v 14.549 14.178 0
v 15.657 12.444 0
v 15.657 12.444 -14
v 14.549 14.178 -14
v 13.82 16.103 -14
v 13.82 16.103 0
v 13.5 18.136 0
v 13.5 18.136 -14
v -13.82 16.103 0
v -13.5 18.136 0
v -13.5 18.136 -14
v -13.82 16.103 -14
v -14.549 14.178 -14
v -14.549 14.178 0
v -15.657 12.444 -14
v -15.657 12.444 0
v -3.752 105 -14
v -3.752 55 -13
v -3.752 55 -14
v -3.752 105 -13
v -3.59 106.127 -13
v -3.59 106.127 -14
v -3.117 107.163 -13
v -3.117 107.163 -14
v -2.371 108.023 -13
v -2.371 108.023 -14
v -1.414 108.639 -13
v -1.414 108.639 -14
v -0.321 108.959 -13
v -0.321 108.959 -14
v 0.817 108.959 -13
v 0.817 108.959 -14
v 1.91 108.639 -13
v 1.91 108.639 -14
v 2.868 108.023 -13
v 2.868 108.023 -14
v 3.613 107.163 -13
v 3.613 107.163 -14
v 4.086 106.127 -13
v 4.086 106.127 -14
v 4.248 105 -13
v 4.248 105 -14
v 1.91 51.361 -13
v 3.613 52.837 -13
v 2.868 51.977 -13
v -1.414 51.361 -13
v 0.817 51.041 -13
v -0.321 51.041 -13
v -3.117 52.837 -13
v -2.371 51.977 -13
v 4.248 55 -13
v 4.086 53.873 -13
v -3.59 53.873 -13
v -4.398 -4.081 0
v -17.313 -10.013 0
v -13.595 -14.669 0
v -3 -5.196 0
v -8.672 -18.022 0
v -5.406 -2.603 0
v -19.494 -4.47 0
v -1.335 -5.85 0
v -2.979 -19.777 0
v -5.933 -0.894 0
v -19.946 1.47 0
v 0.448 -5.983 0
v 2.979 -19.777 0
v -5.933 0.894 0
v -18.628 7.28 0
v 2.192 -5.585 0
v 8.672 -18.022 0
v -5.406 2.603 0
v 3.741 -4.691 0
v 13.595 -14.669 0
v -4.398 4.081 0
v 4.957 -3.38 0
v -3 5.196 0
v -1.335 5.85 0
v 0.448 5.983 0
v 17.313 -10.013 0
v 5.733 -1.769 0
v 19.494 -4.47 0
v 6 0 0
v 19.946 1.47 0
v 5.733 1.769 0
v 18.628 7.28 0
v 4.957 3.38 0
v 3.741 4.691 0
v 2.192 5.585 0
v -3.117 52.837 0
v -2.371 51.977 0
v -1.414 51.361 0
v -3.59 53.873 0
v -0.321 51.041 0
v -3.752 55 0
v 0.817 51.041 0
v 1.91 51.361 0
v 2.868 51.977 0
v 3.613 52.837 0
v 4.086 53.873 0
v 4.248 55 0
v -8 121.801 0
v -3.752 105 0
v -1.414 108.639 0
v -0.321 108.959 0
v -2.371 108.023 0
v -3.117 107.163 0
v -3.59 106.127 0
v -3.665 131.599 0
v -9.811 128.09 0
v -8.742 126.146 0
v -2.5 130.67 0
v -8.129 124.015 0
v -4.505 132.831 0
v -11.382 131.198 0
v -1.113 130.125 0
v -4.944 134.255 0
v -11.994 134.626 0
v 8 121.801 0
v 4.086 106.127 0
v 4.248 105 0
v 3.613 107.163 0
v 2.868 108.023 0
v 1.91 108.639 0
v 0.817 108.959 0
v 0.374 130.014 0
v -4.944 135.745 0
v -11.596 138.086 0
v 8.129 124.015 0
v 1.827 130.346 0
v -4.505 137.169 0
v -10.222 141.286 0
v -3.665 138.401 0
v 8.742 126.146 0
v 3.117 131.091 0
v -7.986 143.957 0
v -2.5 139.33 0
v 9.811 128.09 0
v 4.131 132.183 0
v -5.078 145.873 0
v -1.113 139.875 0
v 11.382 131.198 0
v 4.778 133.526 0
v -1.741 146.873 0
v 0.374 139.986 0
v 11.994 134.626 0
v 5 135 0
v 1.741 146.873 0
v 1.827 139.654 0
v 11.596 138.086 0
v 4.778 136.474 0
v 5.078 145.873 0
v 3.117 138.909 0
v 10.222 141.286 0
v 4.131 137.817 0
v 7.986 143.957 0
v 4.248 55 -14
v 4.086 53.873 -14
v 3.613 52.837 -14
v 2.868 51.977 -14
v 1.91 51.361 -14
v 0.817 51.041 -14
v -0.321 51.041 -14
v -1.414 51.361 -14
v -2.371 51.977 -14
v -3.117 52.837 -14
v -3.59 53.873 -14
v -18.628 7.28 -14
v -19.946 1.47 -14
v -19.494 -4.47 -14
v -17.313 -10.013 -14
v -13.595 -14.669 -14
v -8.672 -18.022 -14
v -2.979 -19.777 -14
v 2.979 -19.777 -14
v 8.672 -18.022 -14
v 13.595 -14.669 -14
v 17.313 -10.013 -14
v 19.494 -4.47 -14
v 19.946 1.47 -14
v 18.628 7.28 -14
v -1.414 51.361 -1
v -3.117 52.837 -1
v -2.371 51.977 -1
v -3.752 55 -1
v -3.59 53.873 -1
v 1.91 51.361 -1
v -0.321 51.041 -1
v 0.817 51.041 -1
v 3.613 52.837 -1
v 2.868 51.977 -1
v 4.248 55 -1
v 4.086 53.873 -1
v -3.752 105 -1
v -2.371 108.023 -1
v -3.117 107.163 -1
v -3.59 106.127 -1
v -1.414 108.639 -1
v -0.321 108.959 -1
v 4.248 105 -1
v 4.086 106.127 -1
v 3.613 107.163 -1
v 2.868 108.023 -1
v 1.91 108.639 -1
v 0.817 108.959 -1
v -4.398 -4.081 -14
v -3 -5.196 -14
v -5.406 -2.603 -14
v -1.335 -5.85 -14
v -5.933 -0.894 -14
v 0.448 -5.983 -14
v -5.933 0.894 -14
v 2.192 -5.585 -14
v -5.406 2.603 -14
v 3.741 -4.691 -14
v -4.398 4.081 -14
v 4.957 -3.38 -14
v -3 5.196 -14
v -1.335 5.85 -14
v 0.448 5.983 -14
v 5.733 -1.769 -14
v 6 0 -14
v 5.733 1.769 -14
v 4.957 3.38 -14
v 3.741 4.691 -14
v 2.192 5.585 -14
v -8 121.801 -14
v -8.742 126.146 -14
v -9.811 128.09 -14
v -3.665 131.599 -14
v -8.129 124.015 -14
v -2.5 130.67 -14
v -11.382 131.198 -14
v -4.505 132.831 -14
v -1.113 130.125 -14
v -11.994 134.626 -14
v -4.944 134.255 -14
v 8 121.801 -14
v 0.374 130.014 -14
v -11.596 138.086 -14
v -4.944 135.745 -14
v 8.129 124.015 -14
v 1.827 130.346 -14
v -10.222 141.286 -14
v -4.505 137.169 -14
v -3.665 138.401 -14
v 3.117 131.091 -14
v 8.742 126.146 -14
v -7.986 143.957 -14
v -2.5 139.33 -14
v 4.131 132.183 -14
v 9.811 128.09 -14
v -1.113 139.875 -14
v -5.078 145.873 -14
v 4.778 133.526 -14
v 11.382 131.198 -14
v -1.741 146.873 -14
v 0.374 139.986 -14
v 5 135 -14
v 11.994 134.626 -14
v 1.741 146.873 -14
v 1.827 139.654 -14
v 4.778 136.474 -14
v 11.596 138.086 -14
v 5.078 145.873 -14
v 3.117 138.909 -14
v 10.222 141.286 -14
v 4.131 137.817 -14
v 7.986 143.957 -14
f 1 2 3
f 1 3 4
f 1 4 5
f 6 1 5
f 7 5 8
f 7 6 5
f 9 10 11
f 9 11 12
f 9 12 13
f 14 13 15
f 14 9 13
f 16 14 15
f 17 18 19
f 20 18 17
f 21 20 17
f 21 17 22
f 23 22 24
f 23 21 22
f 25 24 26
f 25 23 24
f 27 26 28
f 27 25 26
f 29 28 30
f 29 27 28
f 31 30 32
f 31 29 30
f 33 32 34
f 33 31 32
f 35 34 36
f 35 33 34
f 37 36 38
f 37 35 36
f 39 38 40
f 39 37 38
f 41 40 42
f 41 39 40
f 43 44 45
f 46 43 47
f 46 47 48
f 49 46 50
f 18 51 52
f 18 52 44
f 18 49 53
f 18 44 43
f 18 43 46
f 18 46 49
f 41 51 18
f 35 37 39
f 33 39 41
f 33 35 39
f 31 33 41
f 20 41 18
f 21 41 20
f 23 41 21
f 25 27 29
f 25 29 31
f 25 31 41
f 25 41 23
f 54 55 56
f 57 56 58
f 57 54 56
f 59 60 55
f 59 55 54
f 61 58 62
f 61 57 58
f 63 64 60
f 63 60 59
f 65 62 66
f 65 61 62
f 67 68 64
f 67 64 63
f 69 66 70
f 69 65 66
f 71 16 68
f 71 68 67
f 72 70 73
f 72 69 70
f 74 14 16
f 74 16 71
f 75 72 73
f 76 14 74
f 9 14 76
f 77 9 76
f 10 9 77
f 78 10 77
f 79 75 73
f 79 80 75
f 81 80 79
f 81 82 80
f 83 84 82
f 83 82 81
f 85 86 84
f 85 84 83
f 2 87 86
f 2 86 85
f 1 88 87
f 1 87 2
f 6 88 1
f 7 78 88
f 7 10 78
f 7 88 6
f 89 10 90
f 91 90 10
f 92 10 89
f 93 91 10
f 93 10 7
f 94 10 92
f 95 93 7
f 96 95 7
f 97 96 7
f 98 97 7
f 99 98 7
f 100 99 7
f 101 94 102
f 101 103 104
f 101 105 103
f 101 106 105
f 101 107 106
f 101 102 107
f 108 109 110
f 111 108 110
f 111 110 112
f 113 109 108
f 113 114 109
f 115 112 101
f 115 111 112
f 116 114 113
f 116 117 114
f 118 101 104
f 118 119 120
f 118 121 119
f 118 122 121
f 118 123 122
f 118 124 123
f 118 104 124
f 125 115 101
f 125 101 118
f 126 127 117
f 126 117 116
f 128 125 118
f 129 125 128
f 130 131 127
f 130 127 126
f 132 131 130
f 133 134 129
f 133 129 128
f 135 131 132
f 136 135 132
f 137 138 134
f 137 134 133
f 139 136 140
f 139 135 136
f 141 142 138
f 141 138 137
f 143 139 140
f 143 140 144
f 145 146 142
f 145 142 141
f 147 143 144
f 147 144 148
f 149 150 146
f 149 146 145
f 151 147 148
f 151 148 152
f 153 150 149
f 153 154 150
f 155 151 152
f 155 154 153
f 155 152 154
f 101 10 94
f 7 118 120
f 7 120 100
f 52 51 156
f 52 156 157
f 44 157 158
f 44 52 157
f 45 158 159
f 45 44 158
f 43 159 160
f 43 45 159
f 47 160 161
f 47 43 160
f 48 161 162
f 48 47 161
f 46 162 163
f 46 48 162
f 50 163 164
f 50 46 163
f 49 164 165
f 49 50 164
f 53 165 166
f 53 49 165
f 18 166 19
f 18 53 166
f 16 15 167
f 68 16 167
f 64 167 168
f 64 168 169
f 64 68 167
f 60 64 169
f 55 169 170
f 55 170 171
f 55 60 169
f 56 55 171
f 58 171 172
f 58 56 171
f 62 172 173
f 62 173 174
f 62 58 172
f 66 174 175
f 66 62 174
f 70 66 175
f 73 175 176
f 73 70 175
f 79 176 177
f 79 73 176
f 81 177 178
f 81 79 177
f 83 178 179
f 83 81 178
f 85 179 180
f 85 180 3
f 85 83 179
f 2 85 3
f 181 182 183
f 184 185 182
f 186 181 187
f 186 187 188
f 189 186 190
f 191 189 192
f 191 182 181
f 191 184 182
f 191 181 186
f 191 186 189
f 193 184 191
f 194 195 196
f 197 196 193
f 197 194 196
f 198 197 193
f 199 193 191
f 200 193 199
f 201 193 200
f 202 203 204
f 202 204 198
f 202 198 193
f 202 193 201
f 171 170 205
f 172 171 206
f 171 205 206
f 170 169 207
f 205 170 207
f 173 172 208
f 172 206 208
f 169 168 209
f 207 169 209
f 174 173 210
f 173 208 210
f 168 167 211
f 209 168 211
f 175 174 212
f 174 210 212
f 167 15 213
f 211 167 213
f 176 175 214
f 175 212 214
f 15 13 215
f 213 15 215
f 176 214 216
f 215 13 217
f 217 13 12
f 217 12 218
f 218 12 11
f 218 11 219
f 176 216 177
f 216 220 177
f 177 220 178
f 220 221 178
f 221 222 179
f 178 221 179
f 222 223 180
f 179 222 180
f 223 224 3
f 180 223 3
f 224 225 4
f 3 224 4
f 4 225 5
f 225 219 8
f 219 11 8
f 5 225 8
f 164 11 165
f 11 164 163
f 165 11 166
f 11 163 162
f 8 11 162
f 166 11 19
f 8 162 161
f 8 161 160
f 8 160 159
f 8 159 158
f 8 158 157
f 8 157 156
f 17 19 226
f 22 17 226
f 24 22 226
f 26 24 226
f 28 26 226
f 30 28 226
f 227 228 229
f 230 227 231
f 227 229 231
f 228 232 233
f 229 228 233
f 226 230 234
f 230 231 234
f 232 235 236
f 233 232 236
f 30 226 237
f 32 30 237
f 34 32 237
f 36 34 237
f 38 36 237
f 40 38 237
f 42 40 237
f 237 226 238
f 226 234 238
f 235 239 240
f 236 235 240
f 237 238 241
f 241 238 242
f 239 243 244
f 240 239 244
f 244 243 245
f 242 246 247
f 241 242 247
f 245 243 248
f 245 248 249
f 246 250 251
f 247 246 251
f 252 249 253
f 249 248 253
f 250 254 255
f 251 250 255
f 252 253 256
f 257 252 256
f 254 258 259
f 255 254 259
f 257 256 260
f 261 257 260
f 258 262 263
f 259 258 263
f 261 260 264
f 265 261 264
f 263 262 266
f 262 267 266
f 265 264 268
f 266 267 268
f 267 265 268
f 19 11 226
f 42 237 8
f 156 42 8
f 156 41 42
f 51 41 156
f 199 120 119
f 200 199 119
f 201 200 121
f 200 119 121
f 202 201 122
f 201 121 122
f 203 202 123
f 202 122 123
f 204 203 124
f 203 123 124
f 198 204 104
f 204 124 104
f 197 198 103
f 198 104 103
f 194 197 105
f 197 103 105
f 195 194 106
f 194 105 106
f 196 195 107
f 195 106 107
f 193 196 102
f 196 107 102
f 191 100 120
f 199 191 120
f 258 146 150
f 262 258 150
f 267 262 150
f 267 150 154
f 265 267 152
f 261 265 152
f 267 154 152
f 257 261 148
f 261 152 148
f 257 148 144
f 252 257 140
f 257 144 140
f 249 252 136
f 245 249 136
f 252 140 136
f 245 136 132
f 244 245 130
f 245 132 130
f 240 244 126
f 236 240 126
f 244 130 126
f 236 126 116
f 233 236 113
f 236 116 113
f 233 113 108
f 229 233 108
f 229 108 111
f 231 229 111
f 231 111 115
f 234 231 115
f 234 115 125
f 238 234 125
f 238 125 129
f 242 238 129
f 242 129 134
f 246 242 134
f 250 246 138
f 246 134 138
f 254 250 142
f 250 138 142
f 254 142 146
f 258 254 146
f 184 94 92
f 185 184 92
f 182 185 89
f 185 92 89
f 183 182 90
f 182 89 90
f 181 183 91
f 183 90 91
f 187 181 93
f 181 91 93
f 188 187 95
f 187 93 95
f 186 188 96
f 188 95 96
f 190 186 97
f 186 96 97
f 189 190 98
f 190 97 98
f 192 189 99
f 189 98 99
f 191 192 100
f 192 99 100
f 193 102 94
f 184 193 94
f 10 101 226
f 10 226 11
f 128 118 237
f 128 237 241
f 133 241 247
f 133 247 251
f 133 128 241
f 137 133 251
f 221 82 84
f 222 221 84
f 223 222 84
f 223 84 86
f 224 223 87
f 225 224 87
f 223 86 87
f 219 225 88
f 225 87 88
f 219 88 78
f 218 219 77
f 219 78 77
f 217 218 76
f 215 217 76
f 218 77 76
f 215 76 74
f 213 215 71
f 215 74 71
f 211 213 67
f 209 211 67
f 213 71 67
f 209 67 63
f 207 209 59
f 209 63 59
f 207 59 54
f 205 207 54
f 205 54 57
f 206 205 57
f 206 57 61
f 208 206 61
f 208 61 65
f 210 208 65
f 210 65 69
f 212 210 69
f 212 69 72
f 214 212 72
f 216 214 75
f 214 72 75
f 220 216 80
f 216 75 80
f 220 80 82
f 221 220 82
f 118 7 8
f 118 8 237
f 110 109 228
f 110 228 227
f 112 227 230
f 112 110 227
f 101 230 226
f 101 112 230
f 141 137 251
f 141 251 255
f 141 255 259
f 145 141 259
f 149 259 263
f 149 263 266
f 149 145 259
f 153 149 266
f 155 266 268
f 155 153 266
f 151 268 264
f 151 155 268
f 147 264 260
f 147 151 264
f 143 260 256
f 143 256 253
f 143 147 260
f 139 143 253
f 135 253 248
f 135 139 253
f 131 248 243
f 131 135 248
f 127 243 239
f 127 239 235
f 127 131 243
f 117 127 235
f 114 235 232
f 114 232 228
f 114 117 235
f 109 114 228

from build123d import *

# Parameters (mm, degrees)
SKETCH_1_R          = 6
SKETCH_1_R_2        = 5
EXTRUDE_1_DEPTH     = 14
CUT_EXTRUDE_1_DEPTH = 1
CUT_EXTRUDE_START   = -1
CUT_EXTRUDE_2_DEPTH = 1


with BuildPart() as part:
    # 草图1 → 拉伸1 (new body)
    with BuildSketch(Plane.XY):
        with BuildLine():
            Line((-8, 121.801117832), (-13.5, 18.135932445))
            ThreePointArc((-13.5, 18.135932445), (-14.135015735, 15.121742333), (-15.657303504, 12.443827667))
            ThreePointArc((-15.657303504, 12.443827667), (0, -20), (15.657303504, 12.443827667))
            ThreePointArc((15.657303504, 12.443827667), (14.135015735, 15.121742333), (13.5, 18.135932445))
            Line((13.5, 18.135932445), (8, 121.801117832))
            ThreePointArc((8, 121.801117832), (8.376311259, 125.097647375), (9.810521048, 128.089596484))
            ThreePointArc((9.810521048, 128.089596484), (0, 147), (-9.810521048, 128.089596484))
            ThreePointArc((-9.810521048, 128.089596484), (-8.376311259, 125.097647375), (-8, 121.801117832))
        make_face()
        Circle(SKETCH_1_R, mode=Mode.SUBTRACT)
        with Locations((0, 135)):
            Circle(SKETCH_1_R_2, mode=Mode.SUBTRACT)
    extrude(amount=-EXTRUDE_1_DEPTH)

    # 草图2 → 切除-拉伸1 (cut)
    with BuildSketch(Plane.XY):
        with BuildLine():
            Line((-3.75192728, 105), (-3.75192728, 55))
            ThreePointArc((-3.75192728, 55), (0.24807272, 51), (4.24807272, 55))
            Line((4.24807272, 55), (4.24807272, 105))
            ThreePointArc((4.24807272, 105), (0.24807272, 109), (-3.75192728, 105))
        make_face()
    extrude(amount=-CUT_EXTRUDE_1_DEPTH, mode=Mode.SUBTRACT)

    # 草图3 → 切除-拉伸2 (cut)
    with BuildSketch(Plane(origin=(0, 0, -14), x_dir=(-1, 0, 0), z_dir=(0, 0, -1)).offset(CUT_EXTRUDE_START)):
        with BuildLine():
            Line((3.75192728, 55), (3.75192728, 105))
            ThreePointArc((3.75192728, 105), (-0.24807272, 109), (-4.24807272, 105))
            Line((-4.24807272, 105), (-4.24807272, 55))
            ThreePointArc((-4.24807272, 55), (-0.24807272, 51), (3.75192728, 55))
        make_face()
    extrude(amount=CUT_EXTRUDE_2_DEPTH, mode=Mode.SUBTRACT)


solid = part.part
